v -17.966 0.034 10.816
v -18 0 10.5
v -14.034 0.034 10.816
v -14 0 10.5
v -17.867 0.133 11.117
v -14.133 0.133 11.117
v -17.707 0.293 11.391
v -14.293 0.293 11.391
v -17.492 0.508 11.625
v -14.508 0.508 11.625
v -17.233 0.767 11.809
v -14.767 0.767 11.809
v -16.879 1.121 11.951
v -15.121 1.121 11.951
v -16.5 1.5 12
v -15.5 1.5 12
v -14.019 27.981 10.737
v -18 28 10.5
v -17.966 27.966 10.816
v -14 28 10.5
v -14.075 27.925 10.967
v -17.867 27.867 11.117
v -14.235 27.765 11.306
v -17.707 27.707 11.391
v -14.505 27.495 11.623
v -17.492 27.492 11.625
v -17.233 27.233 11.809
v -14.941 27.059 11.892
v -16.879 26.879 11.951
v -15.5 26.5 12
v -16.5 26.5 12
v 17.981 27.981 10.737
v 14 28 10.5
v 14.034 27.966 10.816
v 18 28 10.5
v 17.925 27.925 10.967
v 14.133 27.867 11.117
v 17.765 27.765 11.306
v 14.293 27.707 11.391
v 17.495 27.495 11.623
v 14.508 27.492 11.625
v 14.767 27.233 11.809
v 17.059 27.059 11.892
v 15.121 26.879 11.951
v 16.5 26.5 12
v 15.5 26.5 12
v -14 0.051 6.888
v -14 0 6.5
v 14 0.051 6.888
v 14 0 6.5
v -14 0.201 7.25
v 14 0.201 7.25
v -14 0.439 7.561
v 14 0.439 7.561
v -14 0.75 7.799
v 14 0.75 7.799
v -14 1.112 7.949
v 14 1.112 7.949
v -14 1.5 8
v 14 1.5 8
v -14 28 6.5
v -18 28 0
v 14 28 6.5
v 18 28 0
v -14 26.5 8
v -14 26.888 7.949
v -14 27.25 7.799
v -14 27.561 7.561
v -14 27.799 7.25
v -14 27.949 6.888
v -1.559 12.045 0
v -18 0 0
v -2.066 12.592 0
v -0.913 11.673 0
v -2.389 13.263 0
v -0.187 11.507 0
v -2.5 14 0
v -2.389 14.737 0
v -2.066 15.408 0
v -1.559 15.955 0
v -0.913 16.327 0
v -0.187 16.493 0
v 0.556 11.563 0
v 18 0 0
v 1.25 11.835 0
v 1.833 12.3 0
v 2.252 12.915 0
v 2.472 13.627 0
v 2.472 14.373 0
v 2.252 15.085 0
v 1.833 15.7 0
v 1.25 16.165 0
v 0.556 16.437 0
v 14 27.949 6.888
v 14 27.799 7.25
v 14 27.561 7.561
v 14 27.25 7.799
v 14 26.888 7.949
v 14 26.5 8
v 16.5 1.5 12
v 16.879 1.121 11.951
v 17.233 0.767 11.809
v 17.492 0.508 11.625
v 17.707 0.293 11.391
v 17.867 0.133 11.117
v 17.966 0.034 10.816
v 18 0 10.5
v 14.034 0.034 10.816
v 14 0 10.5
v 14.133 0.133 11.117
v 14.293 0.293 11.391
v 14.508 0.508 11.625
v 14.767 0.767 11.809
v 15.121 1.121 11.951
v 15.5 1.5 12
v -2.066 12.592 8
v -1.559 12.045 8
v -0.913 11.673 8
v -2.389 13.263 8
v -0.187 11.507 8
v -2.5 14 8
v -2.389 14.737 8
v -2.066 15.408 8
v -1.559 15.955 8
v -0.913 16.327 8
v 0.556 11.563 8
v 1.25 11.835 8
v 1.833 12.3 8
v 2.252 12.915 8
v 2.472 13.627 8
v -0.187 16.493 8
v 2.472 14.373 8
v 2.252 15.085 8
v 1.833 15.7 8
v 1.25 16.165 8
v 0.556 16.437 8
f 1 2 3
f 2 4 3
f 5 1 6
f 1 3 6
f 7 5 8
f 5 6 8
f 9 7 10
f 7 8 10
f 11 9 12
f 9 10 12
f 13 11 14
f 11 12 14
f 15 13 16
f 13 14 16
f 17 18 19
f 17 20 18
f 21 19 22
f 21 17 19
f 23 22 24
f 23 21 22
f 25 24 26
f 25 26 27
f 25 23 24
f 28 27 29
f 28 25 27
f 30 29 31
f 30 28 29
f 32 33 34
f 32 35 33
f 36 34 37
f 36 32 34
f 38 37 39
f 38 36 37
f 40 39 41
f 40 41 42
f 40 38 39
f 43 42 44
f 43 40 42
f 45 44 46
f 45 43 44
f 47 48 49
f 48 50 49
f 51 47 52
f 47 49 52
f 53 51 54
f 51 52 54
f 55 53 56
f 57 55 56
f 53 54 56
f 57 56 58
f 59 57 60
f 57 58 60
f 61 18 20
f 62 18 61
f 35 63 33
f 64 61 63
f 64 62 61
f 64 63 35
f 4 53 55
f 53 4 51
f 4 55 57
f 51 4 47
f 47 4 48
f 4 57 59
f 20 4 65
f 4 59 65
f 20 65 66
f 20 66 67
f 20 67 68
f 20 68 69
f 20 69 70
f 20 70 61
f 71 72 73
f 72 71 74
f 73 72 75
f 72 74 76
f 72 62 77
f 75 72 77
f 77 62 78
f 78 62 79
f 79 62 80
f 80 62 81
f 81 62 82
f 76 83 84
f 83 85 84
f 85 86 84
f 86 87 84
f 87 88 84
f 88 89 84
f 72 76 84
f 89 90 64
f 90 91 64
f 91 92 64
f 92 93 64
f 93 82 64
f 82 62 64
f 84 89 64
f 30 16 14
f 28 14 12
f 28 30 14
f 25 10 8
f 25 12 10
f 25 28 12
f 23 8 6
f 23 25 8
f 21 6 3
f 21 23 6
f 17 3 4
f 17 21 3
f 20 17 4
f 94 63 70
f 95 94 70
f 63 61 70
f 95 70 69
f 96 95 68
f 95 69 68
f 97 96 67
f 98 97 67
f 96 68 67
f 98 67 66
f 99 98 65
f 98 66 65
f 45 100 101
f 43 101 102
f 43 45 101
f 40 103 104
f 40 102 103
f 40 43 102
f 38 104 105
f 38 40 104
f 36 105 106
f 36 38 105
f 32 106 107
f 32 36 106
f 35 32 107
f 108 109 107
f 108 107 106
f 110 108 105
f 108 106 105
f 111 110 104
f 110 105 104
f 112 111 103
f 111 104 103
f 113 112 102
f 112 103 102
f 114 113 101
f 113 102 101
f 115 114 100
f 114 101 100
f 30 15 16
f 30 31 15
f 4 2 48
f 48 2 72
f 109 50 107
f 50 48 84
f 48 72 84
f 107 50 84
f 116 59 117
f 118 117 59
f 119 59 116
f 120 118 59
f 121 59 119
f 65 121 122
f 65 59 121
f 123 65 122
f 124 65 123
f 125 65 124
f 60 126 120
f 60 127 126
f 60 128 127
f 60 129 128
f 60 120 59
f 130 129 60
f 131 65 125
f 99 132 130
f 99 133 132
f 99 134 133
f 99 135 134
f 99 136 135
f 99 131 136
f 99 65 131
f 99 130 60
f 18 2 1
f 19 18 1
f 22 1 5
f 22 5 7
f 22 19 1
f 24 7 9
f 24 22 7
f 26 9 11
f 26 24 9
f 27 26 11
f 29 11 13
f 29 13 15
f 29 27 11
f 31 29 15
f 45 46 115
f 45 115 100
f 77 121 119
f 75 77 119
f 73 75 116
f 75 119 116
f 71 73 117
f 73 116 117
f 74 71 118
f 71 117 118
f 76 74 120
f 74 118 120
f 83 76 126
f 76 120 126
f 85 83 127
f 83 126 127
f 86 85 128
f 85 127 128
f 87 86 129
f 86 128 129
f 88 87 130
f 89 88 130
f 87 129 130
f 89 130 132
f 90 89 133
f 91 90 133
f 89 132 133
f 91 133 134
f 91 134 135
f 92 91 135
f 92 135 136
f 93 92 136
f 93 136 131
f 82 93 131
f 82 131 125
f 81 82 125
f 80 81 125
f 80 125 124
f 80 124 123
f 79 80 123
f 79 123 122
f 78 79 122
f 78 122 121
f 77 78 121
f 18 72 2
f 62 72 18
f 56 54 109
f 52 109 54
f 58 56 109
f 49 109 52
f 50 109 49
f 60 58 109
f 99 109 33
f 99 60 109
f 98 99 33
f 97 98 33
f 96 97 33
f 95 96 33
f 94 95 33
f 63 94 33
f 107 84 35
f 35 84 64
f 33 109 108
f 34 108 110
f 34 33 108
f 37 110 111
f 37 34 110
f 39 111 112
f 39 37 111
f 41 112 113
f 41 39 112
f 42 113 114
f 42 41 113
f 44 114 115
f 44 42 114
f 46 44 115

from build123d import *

# Parameters (mm, degrees)
F0_W     = 14
F0_H     = 28
F1_DEPTH = 8
F0_W_2   = 4
F2_DEPTH = 12
F3_D     = 5
F4_R     = 1.5


with BuildPart() as f1:
    # F0 (on Top) → F1 (new body)
    with BuildSketch(Plane.XY):
        with Locations((-7, 14)):
            Rectangle(F0_W, F0_H)
        with Locations((7, 14)):
            Rectangle(F0_W, F0_H)
    extrude(amount=F1_DEPTH)

    # F0 (on Top) → F2 (join)
    with BuildSketch(Plane.XY):
        with Locations((-16, 14)):
            Rectangle(F0_W_2, F0_H)
        with Locations((16, 14)):
            Rectangle(F0_W_2, F0_H)
    extrude(amount=F2_DEPTH)

    # F3 (through all)
    with Locations(Plane(origin=(0, 0, 0), x_dir=(1, 0, 0), z_dir=(0, 0, -1))):
        with Locations((0, -14)):
            Hole(F3_D / 2)

    # F4
    f4_edges = [f1.edges().sort_by_distance(p)[0] for p in [
        (-16, 0, 12),
        (-14, 14, 12),
        (-16, 28, 12),
        (-18, 14, 12),
        (14, 14, 12),
        (16, 0, 12),
        (18, 14, 12),
        (16, 28, 12),
        (0, 28, 8),
        (0, 0, 8),
    ]]
    fillet(f4_edges, radius=F4_R)


solid = f1.part
